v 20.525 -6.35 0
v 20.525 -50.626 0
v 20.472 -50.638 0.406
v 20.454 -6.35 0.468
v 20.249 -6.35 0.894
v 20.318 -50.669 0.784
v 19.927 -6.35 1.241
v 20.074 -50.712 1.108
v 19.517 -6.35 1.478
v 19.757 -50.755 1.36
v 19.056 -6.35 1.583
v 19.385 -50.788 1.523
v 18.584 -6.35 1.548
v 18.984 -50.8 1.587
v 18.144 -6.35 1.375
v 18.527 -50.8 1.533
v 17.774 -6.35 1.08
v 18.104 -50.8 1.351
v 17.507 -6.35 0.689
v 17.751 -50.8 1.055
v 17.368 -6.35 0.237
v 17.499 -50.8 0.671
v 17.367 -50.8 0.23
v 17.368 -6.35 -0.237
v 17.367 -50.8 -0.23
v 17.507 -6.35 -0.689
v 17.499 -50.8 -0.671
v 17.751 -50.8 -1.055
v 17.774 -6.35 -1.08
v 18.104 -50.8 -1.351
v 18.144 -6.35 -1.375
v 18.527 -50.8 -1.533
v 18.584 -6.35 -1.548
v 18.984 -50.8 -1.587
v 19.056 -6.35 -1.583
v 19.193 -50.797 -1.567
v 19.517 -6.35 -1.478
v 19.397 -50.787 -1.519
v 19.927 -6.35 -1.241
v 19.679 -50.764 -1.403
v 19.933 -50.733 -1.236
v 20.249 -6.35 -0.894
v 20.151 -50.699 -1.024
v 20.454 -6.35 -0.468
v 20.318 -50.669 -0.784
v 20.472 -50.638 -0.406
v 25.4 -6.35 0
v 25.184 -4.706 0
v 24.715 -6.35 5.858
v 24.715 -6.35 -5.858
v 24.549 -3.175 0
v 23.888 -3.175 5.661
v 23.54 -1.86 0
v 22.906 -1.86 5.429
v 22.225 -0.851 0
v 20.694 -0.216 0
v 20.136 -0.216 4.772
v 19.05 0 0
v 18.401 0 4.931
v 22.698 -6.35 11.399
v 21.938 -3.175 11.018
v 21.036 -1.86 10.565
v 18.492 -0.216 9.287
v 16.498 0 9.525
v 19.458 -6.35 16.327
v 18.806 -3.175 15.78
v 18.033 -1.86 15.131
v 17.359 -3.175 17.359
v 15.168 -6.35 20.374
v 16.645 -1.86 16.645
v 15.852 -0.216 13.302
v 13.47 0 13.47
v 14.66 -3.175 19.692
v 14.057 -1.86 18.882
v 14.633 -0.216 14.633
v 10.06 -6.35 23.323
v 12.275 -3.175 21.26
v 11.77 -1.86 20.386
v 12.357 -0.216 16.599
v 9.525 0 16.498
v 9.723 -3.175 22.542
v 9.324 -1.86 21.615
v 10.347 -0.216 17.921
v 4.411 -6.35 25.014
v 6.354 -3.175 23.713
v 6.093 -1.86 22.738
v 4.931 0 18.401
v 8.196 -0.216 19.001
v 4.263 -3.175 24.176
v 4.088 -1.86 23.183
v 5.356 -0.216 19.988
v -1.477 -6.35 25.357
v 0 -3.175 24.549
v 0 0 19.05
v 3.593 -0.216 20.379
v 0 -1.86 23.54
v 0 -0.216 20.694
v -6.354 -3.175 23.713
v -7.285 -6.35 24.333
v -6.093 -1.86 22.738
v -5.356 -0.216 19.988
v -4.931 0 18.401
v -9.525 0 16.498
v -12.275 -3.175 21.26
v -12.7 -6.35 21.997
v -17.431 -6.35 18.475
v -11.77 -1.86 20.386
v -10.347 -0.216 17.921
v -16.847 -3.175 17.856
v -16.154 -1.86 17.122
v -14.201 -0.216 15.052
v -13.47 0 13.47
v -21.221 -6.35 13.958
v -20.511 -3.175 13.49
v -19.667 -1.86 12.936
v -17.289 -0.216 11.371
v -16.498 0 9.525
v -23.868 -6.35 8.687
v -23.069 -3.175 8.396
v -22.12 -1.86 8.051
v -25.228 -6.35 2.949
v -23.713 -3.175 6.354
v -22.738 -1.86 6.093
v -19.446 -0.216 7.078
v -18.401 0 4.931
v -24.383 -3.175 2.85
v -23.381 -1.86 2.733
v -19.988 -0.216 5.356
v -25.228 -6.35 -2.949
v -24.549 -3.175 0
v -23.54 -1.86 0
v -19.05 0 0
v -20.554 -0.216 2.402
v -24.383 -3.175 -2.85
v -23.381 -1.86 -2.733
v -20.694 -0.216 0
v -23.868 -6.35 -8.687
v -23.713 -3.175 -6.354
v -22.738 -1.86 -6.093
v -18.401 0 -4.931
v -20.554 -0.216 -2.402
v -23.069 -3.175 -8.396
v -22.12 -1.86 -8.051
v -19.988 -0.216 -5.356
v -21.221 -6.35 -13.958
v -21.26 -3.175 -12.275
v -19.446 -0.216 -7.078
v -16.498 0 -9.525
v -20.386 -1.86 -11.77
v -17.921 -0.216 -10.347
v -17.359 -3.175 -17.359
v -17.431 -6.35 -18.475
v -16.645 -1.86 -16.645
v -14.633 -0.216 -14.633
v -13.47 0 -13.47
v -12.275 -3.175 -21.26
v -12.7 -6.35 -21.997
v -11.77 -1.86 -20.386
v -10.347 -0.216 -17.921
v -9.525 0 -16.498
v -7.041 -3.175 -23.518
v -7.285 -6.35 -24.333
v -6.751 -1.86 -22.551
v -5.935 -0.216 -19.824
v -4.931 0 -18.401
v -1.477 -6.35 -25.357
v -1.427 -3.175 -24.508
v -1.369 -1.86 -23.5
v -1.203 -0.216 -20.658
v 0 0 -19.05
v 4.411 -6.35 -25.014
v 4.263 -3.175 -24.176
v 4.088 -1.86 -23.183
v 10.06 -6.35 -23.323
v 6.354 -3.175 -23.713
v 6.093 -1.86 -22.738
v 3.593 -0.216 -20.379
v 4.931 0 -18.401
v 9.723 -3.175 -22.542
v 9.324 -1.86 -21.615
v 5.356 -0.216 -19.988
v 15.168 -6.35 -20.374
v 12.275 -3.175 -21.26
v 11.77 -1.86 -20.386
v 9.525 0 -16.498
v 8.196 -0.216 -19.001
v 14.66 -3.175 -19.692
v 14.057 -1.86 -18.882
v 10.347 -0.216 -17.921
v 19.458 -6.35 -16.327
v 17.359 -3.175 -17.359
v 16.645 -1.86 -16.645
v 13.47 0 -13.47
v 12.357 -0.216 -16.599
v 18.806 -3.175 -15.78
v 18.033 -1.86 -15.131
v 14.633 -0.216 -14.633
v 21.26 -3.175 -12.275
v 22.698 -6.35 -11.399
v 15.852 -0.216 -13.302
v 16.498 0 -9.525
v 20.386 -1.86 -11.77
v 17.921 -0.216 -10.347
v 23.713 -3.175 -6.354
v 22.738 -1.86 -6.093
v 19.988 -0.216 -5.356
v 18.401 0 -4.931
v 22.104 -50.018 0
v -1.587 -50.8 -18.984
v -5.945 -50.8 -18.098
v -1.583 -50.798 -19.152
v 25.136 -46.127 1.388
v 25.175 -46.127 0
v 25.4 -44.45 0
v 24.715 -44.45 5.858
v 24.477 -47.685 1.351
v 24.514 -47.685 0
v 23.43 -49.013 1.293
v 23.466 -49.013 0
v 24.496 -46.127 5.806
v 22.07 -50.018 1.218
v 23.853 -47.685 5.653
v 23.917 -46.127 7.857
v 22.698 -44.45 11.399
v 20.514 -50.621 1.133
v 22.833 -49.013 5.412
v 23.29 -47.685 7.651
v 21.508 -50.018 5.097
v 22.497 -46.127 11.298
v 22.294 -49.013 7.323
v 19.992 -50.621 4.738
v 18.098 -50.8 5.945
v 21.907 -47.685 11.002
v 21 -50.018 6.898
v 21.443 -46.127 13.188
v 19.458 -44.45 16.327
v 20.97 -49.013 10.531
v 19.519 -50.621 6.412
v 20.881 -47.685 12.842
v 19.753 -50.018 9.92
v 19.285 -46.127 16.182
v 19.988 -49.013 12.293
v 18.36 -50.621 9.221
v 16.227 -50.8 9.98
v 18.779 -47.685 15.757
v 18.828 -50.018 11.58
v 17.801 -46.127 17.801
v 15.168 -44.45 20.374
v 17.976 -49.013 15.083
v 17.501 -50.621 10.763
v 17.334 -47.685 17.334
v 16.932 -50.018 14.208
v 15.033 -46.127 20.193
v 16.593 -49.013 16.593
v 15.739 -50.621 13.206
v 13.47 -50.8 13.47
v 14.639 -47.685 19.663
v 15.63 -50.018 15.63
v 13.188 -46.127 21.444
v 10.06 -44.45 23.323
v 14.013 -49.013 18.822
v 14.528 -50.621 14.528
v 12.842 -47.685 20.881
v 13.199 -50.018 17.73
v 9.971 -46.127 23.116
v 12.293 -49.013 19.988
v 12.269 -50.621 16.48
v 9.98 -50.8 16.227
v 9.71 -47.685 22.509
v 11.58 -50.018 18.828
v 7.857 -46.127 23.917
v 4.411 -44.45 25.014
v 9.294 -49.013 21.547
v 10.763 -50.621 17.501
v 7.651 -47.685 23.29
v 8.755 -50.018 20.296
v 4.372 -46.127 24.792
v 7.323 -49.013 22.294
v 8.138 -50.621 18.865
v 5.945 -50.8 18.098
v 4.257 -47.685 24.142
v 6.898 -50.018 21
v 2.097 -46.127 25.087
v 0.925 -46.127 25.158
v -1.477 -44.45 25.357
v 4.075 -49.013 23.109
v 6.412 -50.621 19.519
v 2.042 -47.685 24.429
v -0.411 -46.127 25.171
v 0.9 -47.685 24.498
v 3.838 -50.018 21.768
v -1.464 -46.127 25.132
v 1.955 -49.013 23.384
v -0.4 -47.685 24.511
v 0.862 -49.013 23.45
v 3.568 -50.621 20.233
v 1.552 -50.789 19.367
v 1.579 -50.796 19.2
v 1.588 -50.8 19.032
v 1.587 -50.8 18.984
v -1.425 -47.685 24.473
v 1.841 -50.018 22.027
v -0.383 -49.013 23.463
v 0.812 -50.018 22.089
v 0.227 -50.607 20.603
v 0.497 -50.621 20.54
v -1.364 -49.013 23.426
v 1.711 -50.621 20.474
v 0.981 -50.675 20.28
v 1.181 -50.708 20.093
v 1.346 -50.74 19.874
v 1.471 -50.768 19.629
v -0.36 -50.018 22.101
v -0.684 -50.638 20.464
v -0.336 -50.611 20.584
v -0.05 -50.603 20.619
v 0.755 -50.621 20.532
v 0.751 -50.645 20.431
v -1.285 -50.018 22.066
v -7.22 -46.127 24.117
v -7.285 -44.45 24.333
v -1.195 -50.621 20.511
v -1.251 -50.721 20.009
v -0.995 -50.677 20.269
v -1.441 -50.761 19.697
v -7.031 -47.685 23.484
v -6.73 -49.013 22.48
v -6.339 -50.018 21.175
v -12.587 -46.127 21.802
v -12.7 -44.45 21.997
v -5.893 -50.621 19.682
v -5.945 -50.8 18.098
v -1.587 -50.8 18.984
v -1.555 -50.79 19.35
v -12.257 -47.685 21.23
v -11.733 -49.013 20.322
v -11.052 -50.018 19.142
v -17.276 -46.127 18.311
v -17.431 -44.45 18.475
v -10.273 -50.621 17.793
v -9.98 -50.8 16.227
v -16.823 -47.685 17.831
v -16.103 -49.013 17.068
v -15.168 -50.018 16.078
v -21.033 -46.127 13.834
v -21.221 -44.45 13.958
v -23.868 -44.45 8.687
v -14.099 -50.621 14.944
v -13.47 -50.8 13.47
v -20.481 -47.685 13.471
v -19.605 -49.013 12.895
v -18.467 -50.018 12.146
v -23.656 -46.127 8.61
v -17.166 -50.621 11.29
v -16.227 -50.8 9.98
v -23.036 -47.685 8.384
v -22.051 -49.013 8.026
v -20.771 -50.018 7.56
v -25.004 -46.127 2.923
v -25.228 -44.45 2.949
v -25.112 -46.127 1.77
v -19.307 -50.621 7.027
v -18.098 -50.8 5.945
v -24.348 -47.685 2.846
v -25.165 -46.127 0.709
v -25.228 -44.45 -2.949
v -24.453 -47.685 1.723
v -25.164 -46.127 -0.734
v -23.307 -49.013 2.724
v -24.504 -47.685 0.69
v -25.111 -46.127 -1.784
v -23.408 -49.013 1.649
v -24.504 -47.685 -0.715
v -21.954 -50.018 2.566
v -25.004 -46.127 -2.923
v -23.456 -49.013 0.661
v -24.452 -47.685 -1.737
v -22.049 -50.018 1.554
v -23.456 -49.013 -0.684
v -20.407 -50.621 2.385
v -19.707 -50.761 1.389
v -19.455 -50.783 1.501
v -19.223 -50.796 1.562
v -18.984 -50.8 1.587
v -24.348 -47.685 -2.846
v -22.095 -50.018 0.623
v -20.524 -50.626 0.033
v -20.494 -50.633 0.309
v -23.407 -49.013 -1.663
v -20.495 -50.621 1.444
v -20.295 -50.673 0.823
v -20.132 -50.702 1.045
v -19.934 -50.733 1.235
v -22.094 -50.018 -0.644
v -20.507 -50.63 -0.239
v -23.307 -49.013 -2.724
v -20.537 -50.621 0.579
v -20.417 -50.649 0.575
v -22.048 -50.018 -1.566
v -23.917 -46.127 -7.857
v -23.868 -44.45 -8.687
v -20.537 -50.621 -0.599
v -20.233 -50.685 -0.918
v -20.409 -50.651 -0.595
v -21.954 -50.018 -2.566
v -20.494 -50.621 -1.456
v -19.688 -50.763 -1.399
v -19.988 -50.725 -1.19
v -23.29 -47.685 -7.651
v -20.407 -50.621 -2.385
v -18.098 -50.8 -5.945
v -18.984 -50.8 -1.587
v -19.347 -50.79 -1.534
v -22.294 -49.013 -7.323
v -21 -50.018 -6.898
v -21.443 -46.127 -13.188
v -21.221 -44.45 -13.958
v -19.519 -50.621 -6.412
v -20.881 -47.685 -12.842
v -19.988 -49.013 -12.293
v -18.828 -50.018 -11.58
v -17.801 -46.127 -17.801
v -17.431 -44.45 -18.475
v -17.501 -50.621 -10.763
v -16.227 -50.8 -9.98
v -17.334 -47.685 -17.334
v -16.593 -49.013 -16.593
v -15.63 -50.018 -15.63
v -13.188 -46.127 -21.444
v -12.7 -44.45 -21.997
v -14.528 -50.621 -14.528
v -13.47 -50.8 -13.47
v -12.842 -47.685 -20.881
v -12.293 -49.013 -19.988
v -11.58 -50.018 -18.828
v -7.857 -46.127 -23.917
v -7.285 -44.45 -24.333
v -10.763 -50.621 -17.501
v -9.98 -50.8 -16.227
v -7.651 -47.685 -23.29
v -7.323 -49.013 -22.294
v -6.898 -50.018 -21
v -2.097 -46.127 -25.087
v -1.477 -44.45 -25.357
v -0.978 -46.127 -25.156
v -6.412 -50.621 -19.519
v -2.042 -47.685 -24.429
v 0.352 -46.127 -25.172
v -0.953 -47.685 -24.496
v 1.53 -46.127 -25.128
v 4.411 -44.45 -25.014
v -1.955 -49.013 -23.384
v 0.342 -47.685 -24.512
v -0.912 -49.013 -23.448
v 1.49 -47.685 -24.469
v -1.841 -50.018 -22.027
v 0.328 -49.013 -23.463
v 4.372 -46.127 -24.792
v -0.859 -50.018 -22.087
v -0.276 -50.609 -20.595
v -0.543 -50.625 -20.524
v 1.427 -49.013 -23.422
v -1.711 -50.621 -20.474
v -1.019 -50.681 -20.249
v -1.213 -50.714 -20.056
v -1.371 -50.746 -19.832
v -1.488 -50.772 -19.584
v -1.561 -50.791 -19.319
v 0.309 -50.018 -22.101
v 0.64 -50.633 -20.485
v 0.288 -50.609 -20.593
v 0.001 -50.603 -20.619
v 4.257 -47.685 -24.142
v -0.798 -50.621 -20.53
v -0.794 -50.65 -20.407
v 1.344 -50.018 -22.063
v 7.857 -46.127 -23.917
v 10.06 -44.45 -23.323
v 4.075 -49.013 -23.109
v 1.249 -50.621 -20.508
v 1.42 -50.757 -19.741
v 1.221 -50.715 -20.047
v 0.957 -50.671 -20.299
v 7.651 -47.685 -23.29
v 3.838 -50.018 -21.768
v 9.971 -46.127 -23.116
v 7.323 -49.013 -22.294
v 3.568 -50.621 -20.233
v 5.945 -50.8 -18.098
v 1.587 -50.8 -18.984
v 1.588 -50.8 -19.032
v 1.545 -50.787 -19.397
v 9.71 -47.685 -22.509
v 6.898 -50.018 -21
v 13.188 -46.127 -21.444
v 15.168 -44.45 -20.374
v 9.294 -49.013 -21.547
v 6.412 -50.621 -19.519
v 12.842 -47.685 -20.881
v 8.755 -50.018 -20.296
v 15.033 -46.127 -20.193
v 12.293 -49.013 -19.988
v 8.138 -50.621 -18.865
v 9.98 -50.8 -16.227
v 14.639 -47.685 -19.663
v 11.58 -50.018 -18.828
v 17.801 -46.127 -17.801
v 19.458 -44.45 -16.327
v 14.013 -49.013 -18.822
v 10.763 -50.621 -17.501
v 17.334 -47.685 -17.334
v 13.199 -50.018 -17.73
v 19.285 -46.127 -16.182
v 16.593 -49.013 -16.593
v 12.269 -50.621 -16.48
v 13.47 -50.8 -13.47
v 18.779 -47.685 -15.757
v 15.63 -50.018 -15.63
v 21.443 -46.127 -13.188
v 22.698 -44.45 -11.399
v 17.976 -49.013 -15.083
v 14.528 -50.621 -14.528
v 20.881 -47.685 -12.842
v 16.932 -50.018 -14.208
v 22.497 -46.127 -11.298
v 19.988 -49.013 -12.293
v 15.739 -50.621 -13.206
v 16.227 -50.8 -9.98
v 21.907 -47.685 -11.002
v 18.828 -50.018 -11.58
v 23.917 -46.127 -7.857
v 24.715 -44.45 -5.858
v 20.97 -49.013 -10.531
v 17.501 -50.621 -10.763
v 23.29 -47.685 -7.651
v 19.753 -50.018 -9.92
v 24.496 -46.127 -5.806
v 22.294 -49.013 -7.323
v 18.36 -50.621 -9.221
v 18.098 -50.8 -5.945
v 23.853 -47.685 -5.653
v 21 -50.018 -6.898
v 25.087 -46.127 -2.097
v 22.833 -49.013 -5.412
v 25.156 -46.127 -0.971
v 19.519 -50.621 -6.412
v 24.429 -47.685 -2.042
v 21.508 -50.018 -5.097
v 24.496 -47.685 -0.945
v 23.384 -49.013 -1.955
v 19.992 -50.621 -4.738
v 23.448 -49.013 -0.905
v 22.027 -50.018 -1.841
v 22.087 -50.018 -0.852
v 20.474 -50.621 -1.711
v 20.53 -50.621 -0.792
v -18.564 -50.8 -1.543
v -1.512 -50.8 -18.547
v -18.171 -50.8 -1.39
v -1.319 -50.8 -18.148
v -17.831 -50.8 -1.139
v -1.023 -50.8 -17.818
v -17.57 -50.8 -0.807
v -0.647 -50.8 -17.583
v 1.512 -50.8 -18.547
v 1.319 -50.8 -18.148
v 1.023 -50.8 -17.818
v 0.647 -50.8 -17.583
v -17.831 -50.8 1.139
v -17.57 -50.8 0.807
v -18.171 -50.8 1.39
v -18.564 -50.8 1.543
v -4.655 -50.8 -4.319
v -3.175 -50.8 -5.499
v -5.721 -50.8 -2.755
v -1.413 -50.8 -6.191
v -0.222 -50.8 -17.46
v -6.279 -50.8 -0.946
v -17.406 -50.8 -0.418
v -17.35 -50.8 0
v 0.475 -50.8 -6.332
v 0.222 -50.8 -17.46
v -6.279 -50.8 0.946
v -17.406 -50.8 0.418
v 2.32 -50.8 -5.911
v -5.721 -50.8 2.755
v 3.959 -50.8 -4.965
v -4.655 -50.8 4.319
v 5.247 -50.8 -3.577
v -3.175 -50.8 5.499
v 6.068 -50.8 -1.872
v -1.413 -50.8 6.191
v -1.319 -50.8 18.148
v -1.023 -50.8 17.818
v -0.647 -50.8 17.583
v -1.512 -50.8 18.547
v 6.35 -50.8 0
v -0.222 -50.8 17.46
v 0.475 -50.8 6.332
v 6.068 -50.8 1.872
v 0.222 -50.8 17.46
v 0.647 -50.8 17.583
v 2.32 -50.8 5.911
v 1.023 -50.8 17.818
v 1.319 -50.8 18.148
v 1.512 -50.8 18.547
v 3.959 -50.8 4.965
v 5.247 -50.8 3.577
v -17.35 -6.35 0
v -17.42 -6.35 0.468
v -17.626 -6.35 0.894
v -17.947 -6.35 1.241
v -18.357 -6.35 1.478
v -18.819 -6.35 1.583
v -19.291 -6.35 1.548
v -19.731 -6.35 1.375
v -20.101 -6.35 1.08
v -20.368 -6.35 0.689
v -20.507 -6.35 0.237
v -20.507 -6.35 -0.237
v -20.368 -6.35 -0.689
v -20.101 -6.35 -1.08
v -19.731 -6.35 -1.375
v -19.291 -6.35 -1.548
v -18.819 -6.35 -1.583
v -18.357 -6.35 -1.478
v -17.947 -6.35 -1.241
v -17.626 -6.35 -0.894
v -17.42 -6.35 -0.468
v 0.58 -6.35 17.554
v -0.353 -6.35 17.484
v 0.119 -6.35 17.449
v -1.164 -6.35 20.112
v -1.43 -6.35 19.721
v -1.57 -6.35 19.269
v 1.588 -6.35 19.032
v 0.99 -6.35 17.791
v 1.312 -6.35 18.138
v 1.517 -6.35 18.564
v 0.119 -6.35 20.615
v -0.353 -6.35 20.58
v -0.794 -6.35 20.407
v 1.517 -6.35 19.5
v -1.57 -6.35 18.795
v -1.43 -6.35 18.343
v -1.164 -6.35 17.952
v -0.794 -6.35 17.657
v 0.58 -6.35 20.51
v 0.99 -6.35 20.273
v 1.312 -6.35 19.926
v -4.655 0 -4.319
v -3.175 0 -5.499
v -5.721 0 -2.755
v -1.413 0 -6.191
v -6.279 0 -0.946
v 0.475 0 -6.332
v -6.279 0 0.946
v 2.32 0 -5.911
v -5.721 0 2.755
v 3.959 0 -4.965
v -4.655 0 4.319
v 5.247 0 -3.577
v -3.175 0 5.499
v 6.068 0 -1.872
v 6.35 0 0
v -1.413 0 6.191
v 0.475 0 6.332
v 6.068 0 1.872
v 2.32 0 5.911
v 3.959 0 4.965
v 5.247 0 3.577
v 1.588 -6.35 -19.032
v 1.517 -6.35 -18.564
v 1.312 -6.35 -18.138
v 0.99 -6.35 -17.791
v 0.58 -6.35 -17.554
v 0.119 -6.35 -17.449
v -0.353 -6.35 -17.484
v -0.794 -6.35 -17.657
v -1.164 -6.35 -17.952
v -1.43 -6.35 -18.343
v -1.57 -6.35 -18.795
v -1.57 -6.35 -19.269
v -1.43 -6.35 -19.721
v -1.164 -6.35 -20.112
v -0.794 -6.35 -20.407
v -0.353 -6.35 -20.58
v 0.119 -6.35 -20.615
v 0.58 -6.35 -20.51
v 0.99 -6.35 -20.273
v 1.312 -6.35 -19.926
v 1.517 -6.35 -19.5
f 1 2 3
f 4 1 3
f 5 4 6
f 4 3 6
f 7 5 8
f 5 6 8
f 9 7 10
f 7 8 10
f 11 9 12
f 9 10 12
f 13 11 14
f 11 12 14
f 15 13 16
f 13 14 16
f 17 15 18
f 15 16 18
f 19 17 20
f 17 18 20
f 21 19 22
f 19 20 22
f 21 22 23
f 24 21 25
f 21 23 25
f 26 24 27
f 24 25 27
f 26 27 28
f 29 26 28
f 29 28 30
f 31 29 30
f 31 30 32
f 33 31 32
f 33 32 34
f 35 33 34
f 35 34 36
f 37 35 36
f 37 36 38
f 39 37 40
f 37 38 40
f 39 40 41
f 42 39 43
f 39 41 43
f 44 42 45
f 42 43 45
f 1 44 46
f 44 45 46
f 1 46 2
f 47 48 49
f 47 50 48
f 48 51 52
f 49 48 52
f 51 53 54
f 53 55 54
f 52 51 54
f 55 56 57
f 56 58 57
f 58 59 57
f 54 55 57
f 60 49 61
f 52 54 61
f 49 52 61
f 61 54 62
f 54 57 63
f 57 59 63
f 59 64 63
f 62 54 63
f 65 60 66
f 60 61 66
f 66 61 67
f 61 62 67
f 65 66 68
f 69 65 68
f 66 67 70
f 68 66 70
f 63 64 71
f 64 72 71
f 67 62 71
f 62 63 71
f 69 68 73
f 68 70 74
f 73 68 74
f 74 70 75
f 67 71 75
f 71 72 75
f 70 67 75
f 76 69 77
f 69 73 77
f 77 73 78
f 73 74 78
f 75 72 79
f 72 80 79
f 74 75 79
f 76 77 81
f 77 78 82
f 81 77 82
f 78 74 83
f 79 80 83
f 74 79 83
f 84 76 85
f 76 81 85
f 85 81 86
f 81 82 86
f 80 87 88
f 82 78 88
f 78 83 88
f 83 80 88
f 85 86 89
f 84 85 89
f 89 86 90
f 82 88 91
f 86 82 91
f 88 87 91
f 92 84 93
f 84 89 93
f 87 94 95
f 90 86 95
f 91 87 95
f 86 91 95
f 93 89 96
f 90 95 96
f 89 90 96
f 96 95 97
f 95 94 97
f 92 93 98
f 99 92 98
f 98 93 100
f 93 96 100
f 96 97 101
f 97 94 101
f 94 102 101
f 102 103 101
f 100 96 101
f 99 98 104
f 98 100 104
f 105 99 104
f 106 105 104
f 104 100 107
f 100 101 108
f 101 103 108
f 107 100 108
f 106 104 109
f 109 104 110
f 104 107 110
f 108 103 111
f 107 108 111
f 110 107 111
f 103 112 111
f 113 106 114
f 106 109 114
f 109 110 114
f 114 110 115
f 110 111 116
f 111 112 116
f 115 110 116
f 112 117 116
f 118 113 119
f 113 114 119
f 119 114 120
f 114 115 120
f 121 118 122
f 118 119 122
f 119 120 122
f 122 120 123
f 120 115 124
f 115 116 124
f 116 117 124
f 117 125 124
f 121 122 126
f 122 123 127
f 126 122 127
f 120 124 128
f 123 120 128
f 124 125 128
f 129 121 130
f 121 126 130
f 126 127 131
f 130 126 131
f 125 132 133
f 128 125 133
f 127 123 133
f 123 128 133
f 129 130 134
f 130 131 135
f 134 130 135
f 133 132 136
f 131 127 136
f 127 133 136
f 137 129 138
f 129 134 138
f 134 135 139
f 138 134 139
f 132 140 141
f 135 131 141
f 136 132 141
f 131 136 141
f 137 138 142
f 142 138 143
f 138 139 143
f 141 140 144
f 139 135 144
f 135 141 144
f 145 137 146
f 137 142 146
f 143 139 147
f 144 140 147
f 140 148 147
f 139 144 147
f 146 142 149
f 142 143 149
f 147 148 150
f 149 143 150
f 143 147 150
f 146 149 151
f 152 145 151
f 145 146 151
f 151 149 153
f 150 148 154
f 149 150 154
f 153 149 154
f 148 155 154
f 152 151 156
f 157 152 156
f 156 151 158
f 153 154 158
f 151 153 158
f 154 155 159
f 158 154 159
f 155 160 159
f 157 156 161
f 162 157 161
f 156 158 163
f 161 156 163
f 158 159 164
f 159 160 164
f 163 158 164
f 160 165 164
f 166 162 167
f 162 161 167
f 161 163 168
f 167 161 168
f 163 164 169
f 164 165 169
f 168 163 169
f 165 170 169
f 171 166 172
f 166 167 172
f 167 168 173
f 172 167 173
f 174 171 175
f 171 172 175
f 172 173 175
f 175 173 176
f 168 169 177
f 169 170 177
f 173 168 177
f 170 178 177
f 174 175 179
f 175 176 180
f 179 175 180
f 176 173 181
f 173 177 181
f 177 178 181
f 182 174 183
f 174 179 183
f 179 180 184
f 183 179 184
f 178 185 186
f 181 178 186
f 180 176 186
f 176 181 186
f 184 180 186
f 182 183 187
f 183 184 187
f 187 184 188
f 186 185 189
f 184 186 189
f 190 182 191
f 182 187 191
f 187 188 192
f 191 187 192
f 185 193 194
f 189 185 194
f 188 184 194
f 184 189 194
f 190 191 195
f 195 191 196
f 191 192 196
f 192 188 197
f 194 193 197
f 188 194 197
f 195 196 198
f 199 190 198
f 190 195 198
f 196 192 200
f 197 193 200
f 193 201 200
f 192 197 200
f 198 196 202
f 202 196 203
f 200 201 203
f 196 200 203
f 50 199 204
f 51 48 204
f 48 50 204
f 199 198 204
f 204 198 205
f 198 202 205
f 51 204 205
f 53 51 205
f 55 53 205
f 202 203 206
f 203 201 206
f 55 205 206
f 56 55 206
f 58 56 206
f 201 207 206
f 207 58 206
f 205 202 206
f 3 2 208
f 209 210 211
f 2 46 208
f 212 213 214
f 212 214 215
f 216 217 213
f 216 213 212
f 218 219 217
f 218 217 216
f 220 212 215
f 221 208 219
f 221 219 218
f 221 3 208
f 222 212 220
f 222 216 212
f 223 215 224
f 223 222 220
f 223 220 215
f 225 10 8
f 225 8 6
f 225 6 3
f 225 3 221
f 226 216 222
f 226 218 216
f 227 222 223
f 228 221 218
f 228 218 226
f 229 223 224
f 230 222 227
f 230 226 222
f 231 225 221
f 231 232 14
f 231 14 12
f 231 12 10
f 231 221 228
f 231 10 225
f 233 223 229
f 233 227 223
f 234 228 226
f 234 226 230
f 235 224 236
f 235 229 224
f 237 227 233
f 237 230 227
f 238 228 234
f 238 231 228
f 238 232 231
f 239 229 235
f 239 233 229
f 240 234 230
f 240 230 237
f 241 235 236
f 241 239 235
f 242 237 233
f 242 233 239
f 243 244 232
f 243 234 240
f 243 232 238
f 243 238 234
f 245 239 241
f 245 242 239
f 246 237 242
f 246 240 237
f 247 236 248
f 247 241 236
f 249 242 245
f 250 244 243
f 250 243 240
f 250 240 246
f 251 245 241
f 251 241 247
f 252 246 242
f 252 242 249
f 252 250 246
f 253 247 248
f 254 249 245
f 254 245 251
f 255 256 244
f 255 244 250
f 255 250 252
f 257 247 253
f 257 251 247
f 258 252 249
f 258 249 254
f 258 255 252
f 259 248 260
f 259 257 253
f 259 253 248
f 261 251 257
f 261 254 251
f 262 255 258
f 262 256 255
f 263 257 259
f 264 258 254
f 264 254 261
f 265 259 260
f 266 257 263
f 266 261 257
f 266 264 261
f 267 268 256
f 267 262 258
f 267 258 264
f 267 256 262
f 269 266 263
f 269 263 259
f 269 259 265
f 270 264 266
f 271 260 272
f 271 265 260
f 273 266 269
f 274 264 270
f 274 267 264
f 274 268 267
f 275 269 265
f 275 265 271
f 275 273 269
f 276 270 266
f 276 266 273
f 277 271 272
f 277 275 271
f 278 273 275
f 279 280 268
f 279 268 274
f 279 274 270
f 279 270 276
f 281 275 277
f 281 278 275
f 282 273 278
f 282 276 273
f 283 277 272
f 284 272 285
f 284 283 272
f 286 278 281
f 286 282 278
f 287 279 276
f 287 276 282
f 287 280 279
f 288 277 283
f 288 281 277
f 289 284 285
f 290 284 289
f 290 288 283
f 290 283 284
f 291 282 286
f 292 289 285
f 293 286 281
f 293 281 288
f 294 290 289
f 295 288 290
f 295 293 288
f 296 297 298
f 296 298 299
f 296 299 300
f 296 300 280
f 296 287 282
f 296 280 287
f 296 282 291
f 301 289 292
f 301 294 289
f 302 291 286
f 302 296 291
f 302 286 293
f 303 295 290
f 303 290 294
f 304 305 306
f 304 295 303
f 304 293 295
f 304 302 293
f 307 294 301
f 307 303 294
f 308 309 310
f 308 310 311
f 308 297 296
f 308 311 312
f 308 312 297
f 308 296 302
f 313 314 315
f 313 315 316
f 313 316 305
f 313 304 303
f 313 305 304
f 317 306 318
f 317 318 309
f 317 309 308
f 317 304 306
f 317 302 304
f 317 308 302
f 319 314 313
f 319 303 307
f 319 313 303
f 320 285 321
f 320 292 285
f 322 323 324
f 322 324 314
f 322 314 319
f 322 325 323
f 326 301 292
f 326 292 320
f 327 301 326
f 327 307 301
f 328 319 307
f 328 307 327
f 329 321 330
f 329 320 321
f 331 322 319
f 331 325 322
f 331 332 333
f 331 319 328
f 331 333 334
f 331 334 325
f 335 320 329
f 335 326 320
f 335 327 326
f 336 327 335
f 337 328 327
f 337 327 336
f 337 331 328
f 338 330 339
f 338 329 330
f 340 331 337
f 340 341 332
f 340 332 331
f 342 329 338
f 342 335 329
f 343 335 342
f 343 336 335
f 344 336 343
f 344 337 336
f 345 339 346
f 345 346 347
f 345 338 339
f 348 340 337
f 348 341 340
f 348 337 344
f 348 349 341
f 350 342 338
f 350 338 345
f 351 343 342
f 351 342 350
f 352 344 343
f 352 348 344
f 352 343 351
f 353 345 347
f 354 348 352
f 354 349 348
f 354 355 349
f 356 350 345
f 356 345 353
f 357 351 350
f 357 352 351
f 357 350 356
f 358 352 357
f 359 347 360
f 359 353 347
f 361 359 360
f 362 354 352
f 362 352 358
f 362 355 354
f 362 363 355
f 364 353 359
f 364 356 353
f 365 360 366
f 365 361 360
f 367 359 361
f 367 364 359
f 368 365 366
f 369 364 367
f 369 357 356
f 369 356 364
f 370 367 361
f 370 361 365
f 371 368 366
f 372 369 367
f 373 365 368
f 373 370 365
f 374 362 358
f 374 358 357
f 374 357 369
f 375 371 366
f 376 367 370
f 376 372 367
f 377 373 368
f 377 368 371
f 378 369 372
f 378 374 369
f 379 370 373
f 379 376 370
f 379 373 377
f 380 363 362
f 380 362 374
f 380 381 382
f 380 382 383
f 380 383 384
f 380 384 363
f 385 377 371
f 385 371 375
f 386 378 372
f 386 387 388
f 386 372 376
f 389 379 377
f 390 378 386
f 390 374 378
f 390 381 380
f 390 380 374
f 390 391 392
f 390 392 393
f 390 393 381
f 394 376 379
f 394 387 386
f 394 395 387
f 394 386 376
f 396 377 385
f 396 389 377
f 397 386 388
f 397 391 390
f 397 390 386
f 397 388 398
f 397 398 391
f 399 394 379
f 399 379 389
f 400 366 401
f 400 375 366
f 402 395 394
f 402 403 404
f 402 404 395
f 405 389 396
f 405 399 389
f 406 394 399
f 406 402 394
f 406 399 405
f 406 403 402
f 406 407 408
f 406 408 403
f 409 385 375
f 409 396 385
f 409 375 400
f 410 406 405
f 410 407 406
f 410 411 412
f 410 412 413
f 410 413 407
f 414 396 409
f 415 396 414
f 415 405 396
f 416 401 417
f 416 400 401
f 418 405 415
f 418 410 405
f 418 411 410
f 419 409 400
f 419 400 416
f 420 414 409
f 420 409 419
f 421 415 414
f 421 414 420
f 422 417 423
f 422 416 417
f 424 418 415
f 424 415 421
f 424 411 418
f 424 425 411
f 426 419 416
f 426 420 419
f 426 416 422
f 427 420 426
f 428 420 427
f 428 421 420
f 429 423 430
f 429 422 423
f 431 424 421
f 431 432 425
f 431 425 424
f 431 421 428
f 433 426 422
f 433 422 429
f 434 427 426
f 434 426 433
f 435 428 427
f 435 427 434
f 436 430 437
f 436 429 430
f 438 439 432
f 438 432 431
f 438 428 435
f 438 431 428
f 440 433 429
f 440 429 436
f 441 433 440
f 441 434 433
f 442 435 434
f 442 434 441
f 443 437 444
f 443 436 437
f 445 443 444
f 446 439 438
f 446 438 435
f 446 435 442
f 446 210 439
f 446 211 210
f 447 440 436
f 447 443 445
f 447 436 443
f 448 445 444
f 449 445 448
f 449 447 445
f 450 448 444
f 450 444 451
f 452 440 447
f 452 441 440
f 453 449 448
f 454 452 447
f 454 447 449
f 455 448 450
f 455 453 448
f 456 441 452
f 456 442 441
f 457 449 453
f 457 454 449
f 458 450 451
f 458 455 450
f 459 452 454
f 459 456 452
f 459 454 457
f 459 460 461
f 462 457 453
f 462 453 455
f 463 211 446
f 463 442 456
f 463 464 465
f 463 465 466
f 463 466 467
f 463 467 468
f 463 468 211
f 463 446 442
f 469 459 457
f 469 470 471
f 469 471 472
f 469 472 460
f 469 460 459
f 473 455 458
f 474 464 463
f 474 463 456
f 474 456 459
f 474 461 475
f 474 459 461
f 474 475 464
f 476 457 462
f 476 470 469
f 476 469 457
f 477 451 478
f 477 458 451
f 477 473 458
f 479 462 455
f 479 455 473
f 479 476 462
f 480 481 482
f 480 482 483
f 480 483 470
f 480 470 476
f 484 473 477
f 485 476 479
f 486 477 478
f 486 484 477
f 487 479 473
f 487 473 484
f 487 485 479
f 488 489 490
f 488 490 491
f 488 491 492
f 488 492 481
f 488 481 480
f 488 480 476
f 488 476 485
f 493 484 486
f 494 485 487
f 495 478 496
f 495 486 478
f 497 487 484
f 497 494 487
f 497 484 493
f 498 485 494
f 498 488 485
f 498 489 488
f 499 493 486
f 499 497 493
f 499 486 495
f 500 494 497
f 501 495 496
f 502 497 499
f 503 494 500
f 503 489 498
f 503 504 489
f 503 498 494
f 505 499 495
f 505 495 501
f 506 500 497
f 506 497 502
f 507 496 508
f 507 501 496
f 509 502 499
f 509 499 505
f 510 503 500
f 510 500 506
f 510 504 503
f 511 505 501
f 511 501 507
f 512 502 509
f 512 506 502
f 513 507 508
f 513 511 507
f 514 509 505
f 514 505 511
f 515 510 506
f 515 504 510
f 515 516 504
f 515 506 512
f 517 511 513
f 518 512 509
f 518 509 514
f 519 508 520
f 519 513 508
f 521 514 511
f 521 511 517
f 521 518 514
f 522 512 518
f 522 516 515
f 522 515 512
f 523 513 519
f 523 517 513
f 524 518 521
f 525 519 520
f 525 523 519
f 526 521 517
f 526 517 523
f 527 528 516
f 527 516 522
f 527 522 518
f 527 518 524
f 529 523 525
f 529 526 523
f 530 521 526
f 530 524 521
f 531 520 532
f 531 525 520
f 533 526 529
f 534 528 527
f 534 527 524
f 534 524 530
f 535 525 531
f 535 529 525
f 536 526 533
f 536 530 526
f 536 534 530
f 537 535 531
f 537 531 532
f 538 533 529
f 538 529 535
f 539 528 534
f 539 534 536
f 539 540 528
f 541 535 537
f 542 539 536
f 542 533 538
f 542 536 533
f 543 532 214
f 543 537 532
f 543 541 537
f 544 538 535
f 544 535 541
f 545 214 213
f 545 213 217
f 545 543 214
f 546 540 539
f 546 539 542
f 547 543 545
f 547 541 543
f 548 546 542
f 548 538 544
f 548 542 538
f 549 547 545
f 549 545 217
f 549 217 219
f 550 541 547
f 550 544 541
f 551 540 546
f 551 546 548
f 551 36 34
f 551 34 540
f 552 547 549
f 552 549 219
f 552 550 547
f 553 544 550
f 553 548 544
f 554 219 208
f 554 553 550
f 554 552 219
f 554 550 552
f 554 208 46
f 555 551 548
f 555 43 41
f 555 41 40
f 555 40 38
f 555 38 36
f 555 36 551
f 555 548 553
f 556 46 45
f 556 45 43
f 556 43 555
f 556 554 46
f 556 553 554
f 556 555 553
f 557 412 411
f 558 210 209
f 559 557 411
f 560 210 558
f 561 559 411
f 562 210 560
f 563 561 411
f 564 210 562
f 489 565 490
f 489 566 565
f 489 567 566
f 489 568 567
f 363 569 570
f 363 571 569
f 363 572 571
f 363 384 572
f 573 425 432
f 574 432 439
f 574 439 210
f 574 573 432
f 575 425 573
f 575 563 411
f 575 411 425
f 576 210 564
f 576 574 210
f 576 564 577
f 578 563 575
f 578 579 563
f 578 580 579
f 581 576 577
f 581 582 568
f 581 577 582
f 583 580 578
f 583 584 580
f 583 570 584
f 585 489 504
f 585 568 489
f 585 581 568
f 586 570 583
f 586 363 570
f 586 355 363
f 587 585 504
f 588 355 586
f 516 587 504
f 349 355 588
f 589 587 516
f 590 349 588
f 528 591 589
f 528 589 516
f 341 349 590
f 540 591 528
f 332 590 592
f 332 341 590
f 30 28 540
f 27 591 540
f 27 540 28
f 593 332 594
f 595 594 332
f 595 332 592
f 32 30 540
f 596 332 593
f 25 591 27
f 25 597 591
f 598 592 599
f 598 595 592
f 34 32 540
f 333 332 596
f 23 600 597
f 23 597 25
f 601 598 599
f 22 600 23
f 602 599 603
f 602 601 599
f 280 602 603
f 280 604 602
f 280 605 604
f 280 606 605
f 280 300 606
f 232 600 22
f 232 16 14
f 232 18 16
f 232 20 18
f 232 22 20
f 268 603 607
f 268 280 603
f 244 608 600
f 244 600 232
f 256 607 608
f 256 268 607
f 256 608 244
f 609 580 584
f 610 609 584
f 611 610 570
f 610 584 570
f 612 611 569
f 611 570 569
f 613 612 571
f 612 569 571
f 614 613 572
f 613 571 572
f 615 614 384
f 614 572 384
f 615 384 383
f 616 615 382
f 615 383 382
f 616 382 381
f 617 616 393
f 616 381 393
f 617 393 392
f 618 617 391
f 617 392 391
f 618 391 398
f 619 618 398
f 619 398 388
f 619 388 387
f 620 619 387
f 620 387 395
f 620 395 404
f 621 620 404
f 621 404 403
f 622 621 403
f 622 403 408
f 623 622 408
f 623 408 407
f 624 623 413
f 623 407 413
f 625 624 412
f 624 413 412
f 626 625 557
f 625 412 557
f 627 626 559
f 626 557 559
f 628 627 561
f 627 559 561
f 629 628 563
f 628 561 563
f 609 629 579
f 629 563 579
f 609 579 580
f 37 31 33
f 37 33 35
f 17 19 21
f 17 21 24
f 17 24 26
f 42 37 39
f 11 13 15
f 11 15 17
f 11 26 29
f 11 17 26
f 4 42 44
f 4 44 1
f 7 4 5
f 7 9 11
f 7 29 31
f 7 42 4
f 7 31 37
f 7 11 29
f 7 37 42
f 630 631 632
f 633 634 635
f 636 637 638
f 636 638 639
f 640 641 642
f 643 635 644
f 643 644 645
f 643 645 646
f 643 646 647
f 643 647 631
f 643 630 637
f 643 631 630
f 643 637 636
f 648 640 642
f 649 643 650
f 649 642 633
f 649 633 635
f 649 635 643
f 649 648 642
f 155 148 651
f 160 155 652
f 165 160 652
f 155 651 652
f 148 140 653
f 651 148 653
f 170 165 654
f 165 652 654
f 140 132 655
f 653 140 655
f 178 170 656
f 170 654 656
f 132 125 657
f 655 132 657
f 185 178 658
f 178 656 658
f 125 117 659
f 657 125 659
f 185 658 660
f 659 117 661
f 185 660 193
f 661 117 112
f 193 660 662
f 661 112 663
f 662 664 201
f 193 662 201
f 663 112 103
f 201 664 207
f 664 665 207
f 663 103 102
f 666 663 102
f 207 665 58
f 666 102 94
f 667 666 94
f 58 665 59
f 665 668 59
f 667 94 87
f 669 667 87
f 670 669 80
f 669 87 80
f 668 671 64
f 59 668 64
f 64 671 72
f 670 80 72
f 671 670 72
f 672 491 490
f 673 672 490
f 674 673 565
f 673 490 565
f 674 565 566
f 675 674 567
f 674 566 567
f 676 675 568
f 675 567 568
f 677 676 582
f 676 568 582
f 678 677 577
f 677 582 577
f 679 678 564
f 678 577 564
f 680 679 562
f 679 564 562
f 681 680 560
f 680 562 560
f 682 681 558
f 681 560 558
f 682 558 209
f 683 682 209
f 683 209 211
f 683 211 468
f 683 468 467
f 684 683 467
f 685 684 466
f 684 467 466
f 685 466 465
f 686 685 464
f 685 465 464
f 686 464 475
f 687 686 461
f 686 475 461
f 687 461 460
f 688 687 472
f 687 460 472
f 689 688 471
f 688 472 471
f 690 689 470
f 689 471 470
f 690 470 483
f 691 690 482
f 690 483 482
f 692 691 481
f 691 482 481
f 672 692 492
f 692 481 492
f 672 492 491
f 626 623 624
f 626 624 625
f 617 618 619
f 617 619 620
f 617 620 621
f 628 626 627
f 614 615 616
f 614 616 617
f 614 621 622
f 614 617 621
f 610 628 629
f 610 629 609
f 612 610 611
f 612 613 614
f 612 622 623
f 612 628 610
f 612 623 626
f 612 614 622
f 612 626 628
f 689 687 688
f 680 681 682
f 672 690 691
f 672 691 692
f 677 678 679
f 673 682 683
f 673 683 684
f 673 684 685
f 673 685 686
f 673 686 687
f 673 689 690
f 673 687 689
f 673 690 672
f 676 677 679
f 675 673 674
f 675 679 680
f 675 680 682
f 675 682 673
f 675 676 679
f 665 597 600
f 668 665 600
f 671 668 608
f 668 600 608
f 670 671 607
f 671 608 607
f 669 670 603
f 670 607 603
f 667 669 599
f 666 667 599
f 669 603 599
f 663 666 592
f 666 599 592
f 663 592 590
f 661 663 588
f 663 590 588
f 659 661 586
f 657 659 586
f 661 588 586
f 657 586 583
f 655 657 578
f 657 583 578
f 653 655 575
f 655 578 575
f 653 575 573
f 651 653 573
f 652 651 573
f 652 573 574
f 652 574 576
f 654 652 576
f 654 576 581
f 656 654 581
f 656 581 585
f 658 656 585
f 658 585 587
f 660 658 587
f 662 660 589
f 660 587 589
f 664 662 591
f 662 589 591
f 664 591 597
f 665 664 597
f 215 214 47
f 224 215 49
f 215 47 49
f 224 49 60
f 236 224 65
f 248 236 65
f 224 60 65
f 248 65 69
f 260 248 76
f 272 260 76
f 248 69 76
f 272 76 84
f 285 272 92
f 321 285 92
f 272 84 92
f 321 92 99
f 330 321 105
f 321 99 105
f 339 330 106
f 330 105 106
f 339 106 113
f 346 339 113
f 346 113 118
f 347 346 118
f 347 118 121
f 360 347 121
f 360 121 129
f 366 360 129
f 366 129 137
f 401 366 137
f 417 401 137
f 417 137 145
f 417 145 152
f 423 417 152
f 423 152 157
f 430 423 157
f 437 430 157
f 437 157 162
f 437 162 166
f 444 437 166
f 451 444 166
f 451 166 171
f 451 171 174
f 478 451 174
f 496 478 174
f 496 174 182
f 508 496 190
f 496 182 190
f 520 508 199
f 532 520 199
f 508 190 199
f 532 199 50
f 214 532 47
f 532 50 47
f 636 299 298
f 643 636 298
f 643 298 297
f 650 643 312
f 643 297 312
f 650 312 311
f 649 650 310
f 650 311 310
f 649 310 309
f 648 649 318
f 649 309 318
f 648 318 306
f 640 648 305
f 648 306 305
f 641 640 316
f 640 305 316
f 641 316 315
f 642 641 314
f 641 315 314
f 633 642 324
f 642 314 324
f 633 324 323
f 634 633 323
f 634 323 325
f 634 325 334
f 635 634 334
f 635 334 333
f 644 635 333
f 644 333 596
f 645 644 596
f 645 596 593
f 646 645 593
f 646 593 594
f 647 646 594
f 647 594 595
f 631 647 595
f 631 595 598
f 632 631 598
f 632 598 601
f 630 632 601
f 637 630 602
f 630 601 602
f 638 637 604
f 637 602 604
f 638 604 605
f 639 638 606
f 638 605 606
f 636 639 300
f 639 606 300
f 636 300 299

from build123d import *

# Parameters (mm, degrees)
F0_R     = 25.4
F1_DEPTH = 50.8
F2_R     = 6.35
F3_DEPTH = 50.8
F4_R     = 1.5875
F5_DEPTH = 44.45
F7_R     = 6.35


# Not quite as in the source:
# - a fillet or chamfer that OpenCascade refuses, or shapes differently, is made with other operations: its cross-section is extruded or revolved along the edge and cut away or added


with BuildPart() as f1:
    # F0 (on Front) → F1 (new body)
    with BuildSketch(Plane.XZ):
        Circle(F0_R)
    extrude(amount=F1_DEPTH)

    # F2 (on face) → F3 (cut)
    with BuildSketch(Plane.XZ.offset(50.8)):
        Circle(F2_R)
    extrude(amount=-F3_DEPTH, mode=Mode.SUBTRACT)

    # F4 (on face) → F5 (cut)
    with BuildSketch(Plane.XZ.offset(50.8)):
        with Locations((0, 19.0319661051)):
            Circle(F4_R)
        with Locations((18.9372766763, 0)):
            Circle(F4_R)
        with Locations((0, -19.0319661051)):
            Circle(F4_R)
        with Locations((-18.9372785389, 0)):
            Circle(F4_R)
    extrude(amount=-F5_DEPTH, mode=Mode.SUBTRACT)

    # F6: fillet of radius 6.35 on 1 edges, made by hand

    # F6_s1 → F6_t2 (revolve, cut)
    with BuildSketch(Plane.XY):
        with BuildLine():
            ThreePointArc((25.4, -44.45), (23.5401280605, -48.9401280605), (19.05, -50.8))
            Line((19.05, -50.8), (25.4, -50.8))
            Line((25.4, -50.8), (25.4, -44.45))
        make_face()
    revolve(axis=Axis((0, -50.8, 0), (0, -1, 0)), mode=Mode.SUBTRACT)

    # F7
    f7_edges = [f1.edges().sort_by_distance(p)[0] for p in [
        (-25.4, 0, 0),
    ]]
    fillet(f7_edges, radius=F7_R)


solid = f1.part
